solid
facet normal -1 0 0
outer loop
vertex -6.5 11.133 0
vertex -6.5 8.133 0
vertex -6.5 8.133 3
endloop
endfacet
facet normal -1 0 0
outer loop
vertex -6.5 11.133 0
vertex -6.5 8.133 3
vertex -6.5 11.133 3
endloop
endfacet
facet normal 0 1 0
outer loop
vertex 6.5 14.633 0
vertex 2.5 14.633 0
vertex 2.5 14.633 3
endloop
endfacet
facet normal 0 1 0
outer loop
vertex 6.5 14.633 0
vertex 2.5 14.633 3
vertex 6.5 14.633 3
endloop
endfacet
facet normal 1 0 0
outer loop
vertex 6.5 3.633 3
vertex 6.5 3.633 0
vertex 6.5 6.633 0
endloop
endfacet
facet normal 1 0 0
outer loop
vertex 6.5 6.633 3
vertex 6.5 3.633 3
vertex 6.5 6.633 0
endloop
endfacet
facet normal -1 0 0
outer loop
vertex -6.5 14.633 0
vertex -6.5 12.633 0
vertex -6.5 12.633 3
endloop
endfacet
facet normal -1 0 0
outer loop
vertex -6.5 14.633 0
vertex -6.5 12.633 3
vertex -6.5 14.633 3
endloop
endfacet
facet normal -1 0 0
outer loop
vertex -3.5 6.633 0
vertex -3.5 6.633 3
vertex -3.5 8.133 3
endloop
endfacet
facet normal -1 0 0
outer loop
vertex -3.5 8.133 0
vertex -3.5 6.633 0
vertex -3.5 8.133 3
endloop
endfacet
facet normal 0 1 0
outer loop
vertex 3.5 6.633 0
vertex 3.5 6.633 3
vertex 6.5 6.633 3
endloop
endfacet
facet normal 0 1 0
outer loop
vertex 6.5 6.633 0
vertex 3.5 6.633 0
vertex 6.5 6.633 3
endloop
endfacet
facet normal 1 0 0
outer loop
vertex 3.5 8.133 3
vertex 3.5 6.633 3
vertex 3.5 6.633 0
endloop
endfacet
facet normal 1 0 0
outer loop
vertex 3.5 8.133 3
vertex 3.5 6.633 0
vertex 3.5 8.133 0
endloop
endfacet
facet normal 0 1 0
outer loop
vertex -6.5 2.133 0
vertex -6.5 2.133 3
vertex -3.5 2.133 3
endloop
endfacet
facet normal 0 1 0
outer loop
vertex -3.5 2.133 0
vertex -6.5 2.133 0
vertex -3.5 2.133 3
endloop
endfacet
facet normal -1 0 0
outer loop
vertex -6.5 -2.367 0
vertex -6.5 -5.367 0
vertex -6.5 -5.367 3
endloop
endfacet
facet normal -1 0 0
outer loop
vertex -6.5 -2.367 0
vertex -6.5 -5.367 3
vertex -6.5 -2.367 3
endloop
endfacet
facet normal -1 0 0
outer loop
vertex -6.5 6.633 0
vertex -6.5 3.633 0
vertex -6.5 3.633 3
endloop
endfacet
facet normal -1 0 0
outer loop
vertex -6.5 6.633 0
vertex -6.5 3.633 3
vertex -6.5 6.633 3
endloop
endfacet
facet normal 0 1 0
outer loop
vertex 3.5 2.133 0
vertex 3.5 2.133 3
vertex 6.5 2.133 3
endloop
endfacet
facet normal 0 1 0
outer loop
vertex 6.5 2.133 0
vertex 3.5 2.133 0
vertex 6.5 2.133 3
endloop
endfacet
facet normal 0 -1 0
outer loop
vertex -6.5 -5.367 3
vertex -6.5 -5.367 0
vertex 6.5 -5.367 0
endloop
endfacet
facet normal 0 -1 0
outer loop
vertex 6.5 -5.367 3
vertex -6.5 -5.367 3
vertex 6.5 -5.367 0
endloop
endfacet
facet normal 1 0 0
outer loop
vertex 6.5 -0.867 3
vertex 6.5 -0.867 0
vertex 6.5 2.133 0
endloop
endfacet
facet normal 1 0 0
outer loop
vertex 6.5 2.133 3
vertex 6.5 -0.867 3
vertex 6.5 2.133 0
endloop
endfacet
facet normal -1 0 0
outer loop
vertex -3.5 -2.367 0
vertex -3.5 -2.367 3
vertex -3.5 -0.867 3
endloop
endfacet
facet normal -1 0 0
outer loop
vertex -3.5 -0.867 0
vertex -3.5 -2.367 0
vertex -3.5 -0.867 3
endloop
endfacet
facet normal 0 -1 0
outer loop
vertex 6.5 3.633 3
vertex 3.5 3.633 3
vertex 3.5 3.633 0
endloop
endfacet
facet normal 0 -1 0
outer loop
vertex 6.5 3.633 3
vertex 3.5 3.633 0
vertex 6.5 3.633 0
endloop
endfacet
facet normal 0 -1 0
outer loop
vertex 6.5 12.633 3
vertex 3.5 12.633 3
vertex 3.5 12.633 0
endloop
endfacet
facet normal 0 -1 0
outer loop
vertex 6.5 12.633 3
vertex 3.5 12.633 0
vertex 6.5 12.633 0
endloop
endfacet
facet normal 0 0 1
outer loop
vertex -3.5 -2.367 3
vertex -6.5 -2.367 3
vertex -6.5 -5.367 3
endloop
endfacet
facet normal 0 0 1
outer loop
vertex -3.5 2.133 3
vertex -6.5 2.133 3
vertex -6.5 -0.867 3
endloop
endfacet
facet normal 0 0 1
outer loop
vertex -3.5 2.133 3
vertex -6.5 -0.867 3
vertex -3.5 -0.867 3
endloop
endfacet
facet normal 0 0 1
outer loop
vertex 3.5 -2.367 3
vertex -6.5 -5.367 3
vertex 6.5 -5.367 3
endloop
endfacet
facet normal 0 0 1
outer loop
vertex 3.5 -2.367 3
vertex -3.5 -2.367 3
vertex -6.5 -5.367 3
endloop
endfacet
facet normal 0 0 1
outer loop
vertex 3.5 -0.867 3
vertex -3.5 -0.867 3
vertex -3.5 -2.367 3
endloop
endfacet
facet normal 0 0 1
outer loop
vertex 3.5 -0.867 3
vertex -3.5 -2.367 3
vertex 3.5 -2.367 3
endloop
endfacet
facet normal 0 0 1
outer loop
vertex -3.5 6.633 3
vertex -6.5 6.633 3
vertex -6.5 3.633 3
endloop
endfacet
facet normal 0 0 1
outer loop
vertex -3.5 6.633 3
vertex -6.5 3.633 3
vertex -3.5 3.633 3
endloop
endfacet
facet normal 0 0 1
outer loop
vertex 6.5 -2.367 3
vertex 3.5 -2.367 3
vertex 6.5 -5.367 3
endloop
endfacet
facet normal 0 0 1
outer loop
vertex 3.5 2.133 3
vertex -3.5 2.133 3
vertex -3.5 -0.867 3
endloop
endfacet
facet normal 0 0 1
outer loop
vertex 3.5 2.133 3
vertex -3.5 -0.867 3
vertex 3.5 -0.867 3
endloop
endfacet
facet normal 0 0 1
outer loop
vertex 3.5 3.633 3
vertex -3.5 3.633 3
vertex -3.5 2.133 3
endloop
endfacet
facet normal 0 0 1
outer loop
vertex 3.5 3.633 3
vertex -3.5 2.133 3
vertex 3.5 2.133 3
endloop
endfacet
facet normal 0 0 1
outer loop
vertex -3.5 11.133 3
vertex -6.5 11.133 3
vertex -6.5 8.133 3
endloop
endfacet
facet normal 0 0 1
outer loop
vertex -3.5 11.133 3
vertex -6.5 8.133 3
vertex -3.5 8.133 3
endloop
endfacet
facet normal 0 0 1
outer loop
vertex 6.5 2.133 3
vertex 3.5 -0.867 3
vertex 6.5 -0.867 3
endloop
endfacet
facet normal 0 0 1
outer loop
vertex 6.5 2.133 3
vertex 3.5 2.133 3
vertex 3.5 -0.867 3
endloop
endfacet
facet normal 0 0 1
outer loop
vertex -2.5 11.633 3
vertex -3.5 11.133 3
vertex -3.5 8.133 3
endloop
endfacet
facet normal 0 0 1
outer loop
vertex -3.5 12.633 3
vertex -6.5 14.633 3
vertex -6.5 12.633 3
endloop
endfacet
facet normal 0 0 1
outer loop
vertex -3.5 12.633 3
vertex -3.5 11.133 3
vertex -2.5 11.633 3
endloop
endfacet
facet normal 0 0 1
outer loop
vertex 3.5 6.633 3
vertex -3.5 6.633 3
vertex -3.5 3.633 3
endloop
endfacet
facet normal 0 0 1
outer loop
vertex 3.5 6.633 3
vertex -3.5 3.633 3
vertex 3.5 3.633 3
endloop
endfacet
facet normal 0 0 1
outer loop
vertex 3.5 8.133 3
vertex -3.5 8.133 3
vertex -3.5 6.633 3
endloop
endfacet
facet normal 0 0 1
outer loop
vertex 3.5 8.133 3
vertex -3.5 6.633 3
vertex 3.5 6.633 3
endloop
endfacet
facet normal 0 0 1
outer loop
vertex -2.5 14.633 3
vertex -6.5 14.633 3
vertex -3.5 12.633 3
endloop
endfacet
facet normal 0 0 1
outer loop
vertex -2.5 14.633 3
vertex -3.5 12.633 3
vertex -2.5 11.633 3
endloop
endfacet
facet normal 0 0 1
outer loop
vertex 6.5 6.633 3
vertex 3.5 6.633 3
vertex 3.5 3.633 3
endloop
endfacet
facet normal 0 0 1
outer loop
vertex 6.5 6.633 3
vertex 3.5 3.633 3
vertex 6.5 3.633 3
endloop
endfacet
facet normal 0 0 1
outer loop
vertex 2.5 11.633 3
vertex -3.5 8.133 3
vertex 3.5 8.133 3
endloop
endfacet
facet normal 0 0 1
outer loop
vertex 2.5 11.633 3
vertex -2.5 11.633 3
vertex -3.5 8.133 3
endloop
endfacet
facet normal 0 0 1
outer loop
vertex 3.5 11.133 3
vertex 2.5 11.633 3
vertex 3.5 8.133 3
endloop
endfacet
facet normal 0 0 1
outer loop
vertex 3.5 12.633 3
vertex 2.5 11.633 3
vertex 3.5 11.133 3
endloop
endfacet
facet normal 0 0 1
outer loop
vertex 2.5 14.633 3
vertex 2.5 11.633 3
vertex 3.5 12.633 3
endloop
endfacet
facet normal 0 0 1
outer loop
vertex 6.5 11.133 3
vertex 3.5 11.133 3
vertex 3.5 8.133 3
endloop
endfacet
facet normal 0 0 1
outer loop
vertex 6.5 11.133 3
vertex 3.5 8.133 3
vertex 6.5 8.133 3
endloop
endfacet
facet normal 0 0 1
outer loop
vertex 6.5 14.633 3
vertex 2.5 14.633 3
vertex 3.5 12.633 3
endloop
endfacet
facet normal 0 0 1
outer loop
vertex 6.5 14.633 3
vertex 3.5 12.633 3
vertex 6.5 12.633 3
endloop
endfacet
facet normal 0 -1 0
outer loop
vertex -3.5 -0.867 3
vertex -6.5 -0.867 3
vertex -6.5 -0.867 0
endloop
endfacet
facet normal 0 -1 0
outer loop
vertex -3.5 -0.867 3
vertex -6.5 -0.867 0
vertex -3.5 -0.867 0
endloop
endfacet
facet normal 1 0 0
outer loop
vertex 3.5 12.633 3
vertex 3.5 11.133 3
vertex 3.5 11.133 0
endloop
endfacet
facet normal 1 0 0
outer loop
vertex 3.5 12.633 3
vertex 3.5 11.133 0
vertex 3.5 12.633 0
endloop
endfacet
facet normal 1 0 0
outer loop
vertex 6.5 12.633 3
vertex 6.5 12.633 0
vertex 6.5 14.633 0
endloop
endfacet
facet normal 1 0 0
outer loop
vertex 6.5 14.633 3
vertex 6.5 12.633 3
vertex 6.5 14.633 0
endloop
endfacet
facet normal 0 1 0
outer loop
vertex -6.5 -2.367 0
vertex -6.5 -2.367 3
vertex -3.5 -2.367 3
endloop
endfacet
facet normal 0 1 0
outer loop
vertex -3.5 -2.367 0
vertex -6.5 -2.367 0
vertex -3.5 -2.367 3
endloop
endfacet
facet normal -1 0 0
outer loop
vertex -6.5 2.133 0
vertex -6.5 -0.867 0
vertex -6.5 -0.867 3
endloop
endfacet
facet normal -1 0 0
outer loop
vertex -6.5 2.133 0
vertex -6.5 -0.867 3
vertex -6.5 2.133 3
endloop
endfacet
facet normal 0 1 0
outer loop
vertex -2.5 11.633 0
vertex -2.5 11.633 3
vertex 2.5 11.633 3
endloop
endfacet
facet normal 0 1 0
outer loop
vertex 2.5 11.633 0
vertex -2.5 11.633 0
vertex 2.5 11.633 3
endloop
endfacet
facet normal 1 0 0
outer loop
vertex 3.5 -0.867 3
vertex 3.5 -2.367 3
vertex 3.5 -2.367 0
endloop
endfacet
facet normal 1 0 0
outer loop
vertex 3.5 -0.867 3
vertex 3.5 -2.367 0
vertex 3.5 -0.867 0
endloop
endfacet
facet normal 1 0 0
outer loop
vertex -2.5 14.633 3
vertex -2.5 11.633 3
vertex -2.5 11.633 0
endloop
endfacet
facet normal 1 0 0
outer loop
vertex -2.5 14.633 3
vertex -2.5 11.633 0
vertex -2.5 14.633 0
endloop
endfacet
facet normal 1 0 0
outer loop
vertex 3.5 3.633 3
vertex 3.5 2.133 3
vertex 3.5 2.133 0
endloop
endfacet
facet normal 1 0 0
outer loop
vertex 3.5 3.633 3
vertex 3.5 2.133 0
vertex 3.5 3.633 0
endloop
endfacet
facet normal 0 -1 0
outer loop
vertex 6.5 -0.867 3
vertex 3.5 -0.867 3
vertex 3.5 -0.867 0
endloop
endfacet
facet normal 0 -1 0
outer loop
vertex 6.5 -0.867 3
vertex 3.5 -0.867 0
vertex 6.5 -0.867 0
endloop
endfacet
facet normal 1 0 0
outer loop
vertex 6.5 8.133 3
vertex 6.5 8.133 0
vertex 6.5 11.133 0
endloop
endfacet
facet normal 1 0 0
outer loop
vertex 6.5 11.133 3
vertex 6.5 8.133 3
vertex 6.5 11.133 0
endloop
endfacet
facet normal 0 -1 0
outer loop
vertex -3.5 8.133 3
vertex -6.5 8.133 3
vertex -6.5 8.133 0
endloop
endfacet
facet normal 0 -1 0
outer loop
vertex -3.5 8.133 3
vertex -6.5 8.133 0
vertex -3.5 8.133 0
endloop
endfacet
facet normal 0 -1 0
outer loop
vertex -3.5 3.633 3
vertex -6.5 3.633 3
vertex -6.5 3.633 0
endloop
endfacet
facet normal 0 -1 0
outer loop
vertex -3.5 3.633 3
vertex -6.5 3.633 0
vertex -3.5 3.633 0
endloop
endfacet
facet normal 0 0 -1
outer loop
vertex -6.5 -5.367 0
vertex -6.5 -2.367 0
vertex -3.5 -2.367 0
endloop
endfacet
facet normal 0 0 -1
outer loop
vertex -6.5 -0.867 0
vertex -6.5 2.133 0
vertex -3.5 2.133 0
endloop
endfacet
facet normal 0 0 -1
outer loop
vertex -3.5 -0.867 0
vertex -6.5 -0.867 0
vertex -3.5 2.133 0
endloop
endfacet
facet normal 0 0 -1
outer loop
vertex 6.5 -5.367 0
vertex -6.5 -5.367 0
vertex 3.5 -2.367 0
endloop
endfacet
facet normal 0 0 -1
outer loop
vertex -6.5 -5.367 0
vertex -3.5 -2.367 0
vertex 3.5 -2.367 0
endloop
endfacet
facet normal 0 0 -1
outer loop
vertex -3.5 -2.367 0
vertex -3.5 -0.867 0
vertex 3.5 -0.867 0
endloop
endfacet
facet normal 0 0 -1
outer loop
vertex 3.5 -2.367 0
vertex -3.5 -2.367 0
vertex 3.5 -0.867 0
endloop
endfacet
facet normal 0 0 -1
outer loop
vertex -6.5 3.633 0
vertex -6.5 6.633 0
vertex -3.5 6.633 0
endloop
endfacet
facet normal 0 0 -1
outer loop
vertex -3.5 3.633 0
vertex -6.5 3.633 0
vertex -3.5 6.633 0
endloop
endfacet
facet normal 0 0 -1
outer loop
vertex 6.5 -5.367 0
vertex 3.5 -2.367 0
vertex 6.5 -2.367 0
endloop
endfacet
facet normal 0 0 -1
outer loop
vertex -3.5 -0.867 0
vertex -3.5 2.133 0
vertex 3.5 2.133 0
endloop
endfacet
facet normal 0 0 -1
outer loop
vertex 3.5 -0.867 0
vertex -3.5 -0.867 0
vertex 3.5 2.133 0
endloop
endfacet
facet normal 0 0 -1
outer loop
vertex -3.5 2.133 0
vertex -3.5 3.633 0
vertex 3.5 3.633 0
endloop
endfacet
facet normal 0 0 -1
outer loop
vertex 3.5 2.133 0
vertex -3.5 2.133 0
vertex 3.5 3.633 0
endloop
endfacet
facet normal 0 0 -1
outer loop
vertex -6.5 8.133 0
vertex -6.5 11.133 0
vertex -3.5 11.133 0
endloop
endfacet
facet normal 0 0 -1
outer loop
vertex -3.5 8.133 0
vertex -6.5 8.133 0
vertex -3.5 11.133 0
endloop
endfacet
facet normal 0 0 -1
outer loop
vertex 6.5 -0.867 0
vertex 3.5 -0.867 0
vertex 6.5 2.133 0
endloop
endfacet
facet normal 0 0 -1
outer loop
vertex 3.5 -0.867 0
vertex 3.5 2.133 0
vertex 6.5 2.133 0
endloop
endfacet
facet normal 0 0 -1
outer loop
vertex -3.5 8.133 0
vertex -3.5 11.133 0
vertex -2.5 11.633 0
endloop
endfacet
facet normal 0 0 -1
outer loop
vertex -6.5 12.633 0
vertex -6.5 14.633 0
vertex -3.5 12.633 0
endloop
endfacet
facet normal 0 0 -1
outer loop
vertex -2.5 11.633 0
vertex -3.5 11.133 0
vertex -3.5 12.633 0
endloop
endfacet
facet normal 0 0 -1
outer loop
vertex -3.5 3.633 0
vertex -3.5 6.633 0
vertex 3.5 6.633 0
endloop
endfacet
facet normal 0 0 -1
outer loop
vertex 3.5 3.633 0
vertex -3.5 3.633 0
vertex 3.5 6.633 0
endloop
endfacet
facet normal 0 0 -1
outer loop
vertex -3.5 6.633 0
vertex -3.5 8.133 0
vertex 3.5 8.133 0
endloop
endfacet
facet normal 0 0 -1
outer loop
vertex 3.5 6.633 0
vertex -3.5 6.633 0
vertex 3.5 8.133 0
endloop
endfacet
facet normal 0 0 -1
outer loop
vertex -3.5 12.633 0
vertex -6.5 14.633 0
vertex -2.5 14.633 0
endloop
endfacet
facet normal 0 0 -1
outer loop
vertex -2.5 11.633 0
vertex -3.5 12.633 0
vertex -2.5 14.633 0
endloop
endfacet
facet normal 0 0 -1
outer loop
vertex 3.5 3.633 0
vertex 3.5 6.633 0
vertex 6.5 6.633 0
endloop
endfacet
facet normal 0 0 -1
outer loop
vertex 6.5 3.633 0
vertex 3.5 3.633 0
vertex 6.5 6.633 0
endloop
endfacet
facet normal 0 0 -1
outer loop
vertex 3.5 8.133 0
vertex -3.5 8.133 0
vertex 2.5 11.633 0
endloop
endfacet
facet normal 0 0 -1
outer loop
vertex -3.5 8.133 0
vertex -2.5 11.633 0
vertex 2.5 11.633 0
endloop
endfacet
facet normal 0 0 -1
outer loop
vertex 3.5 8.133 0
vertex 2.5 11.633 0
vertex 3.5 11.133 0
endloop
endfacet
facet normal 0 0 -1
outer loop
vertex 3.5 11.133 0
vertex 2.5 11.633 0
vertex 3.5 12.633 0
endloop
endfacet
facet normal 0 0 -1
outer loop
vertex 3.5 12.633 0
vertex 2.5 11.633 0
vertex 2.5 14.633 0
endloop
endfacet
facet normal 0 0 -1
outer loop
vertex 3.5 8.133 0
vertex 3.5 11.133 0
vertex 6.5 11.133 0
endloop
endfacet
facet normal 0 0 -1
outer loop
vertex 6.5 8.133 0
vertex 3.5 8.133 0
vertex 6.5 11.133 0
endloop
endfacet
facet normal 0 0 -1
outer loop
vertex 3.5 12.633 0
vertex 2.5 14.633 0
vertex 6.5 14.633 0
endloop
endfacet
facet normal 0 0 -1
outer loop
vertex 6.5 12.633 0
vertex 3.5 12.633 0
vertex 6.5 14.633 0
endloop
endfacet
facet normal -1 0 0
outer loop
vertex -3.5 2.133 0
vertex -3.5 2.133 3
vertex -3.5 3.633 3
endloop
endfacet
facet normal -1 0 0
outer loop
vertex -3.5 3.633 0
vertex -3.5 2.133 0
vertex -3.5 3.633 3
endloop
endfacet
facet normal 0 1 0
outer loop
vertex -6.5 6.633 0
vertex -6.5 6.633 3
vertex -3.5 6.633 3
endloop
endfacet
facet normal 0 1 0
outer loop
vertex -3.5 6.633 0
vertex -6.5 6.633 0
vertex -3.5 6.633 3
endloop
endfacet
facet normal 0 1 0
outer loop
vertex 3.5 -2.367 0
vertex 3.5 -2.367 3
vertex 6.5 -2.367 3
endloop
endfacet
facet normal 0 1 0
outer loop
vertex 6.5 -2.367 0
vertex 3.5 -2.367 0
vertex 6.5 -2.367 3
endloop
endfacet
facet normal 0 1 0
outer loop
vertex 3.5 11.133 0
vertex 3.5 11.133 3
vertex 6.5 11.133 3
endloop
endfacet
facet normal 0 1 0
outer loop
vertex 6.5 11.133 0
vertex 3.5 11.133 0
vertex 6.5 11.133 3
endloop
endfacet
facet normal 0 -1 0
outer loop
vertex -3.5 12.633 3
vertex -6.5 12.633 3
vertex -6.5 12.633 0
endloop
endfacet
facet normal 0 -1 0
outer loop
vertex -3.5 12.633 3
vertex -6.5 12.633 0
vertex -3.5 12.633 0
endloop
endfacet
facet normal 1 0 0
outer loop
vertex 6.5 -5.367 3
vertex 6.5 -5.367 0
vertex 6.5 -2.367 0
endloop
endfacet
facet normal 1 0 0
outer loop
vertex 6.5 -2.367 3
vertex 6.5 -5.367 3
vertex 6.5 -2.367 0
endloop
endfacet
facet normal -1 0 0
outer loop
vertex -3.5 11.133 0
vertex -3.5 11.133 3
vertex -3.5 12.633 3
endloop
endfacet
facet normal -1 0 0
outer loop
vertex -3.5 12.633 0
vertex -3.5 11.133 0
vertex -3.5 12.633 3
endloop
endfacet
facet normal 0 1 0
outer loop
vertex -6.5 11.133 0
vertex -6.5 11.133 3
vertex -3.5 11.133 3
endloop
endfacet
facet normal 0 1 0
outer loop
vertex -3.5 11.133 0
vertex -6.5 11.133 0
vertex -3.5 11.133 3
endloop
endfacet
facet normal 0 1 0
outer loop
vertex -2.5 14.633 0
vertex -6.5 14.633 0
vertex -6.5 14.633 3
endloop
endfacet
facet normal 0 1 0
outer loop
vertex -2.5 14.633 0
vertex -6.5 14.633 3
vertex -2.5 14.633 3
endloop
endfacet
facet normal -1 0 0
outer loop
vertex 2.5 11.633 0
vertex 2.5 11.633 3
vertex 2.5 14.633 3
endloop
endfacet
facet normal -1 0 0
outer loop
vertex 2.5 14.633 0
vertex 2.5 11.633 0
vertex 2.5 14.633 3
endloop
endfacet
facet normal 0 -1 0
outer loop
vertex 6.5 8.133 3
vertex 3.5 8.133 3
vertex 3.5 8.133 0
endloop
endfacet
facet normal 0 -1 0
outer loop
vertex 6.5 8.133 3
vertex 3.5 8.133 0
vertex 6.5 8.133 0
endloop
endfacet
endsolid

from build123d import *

# Parameters (mm, degrees)
SKETCH1_W           = 13
SKETCH1_H           = 20
BOSS_EXTRUDE1_DEPTH = 3
SKETCH2_W           = 3
SKETCH2_H           = 1.5
CUT_EXTRUDE1_DEPTH  = 3
SKETCH3_W           = 3
SKETCH3_H           = 1.5
CUT_EXTRUDE2_DEPTH  = 3
SKETCH5_W           = 5
SKETCH5_H           = 3
CUT_EXTRUDE6_DEPTH  = 3
SKETCH6_W           = 3
SKETCH6_H           = 1.5
CUT_EXTRUDE7_DEPTH  = 10


with BuildPart() as part:
    # Sketch1 → Boss-Extrude1 (new body)
    with BuildSketch(Plane.XY):
        with Locations((0, 4.633458647)):
            Rectangle(SKETCH1_W, SKETCH1_H)
    extrude(amount=BOSS_EXTRUDE1_DEPTH)

    # Sketch2 → Cut-Extrude1 (cut)
    with BuildSketch(Plane.XY.offset(3)):
        with Locations((-5, 11.883458647)):
            Rectangle(SKETCH2_W, SKETCH2_H)
        with Locations((-5, 7.383458647)):
            Rectangle(SKETCH2_W, SKETCH2_H)
    extrude(amount=-CUT_EXTRUDE1_DEPTH, mode=Mode.SUBTRACT)

    # Sketch3 → Cut-Extrude2 (cut)
    with BuildSketch(Plane.XY.offset(3)):
        with Locations((5, 11.883458647)):
            Rectangle(SKETCH3_W, SKETCH3_H)
        with Locations((5, 7.383458647)):
            Rectangle(SKETCH3_W, SKETCH3_H)
    extrude(amount=-CUT_EXTRUDE2_DEPTH, mode=Mode.SUBTRACT)

    # Sketch5 → Cut-Extrude6 (cut)
    with BuildSketch(Plane.XY.offset(3)):
        with Locations((0, 13.133458647)):
            Rectangle(SKETCH5_W, SKETCH5_H)
    extrude(amount=-CUT_EXTRUDE6_DEPTH, mode=Mode.SUBTRACT)

    # Sketch6 → Cut-Extrude7 (cut)
    with BuildSketch(Plane.XY.offset(3)):
        with Locations((-5, 2.883458647)):
            Rectangle(SKETCH6_W, SKETCH6_H)
        with Locations((-5, -1.616541353)):
            Rectangle(SKETCH6_W, SKETCH6_H)
        with Locations((5, 2.883458647)):
            Rectangle(SKETCH6_W, SKETCH6_H)
        with Locations((5, -1.616541353)):
            Rectangle(SKETCH6_W, SKETCH6_H)
    extrude(amount=-CUT_EXTRUDE7_DEPTH, mode=Mode.SUBTRACT)


solid = part.part
